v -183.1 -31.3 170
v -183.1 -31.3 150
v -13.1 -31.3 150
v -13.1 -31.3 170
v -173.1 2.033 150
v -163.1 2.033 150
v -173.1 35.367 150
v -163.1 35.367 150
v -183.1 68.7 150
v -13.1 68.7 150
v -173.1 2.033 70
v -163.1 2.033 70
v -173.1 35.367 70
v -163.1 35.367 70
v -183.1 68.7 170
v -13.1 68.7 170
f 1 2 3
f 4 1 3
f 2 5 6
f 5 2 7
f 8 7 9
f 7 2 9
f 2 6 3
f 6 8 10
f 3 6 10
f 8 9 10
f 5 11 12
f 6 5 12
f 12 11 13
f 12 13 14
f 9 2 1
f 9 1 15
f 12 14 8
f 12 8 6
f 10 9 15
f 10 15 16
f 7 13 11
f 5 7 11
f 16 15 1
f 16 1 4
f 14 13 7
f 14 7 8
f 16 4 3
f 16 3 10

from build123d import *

# Parameters (mm, degrees)
SKETCH018_W      = 100
SKETCH018_H      = 20
EXTRUDE018_DEPTH = 150
SKETCH017_W      = 20
SKETCH017_H      = 100
EXTRUDE017_DEPTH = 20
SKETCH019_W      = 10
SKETCH019_H      = 33.333334
EXTRUDE019_DEPTH = 80


with BuildPart() as extrude018:
    # Sketch018 (on Face2 of Extrude017) → Extrude018 (new body)
    with BuildSketch(Plane.YZ.offset(-163.1)):
        with Locations((18.7, 160)):
            Rectangle(SKETCH018_W, SKETCH018_H)
    extrude(amount=EXTRUDE018_DEPTH)


with BuildPart() as extrude017:
    # Sketch017 (on Face4 of Cut015) → Extrude017 (new body)
    with BuildSketch(Plane.XY.offset(150)):
        with Locations((-173.1, 18.7)):
            Rectangle(SKETCH017_W, SKETCH017_H)
    extrude(amount=EXTRUDE017_DEPTH)


with BuildPart() as fusion012:
    # Sketch019 (on Face5 of Extrude017) → Extrude019 (new body)
    with BuildSketch(Plane(origin=(0, 0, 150), x_dir=(1, 0, 0), z_dir=(0, 0, -1))):
        with Locations((-168.1, -18.7)):
            Rectangle(SKETCH019_W, SKETCH019_H)
    extrude(amount=EXTRUDE019_DEPTH)

    # Fusion012: union Extrude018, Extrude017
    add(extrude018.part)
    add(extrude017.part)


solid = fusion012.part
